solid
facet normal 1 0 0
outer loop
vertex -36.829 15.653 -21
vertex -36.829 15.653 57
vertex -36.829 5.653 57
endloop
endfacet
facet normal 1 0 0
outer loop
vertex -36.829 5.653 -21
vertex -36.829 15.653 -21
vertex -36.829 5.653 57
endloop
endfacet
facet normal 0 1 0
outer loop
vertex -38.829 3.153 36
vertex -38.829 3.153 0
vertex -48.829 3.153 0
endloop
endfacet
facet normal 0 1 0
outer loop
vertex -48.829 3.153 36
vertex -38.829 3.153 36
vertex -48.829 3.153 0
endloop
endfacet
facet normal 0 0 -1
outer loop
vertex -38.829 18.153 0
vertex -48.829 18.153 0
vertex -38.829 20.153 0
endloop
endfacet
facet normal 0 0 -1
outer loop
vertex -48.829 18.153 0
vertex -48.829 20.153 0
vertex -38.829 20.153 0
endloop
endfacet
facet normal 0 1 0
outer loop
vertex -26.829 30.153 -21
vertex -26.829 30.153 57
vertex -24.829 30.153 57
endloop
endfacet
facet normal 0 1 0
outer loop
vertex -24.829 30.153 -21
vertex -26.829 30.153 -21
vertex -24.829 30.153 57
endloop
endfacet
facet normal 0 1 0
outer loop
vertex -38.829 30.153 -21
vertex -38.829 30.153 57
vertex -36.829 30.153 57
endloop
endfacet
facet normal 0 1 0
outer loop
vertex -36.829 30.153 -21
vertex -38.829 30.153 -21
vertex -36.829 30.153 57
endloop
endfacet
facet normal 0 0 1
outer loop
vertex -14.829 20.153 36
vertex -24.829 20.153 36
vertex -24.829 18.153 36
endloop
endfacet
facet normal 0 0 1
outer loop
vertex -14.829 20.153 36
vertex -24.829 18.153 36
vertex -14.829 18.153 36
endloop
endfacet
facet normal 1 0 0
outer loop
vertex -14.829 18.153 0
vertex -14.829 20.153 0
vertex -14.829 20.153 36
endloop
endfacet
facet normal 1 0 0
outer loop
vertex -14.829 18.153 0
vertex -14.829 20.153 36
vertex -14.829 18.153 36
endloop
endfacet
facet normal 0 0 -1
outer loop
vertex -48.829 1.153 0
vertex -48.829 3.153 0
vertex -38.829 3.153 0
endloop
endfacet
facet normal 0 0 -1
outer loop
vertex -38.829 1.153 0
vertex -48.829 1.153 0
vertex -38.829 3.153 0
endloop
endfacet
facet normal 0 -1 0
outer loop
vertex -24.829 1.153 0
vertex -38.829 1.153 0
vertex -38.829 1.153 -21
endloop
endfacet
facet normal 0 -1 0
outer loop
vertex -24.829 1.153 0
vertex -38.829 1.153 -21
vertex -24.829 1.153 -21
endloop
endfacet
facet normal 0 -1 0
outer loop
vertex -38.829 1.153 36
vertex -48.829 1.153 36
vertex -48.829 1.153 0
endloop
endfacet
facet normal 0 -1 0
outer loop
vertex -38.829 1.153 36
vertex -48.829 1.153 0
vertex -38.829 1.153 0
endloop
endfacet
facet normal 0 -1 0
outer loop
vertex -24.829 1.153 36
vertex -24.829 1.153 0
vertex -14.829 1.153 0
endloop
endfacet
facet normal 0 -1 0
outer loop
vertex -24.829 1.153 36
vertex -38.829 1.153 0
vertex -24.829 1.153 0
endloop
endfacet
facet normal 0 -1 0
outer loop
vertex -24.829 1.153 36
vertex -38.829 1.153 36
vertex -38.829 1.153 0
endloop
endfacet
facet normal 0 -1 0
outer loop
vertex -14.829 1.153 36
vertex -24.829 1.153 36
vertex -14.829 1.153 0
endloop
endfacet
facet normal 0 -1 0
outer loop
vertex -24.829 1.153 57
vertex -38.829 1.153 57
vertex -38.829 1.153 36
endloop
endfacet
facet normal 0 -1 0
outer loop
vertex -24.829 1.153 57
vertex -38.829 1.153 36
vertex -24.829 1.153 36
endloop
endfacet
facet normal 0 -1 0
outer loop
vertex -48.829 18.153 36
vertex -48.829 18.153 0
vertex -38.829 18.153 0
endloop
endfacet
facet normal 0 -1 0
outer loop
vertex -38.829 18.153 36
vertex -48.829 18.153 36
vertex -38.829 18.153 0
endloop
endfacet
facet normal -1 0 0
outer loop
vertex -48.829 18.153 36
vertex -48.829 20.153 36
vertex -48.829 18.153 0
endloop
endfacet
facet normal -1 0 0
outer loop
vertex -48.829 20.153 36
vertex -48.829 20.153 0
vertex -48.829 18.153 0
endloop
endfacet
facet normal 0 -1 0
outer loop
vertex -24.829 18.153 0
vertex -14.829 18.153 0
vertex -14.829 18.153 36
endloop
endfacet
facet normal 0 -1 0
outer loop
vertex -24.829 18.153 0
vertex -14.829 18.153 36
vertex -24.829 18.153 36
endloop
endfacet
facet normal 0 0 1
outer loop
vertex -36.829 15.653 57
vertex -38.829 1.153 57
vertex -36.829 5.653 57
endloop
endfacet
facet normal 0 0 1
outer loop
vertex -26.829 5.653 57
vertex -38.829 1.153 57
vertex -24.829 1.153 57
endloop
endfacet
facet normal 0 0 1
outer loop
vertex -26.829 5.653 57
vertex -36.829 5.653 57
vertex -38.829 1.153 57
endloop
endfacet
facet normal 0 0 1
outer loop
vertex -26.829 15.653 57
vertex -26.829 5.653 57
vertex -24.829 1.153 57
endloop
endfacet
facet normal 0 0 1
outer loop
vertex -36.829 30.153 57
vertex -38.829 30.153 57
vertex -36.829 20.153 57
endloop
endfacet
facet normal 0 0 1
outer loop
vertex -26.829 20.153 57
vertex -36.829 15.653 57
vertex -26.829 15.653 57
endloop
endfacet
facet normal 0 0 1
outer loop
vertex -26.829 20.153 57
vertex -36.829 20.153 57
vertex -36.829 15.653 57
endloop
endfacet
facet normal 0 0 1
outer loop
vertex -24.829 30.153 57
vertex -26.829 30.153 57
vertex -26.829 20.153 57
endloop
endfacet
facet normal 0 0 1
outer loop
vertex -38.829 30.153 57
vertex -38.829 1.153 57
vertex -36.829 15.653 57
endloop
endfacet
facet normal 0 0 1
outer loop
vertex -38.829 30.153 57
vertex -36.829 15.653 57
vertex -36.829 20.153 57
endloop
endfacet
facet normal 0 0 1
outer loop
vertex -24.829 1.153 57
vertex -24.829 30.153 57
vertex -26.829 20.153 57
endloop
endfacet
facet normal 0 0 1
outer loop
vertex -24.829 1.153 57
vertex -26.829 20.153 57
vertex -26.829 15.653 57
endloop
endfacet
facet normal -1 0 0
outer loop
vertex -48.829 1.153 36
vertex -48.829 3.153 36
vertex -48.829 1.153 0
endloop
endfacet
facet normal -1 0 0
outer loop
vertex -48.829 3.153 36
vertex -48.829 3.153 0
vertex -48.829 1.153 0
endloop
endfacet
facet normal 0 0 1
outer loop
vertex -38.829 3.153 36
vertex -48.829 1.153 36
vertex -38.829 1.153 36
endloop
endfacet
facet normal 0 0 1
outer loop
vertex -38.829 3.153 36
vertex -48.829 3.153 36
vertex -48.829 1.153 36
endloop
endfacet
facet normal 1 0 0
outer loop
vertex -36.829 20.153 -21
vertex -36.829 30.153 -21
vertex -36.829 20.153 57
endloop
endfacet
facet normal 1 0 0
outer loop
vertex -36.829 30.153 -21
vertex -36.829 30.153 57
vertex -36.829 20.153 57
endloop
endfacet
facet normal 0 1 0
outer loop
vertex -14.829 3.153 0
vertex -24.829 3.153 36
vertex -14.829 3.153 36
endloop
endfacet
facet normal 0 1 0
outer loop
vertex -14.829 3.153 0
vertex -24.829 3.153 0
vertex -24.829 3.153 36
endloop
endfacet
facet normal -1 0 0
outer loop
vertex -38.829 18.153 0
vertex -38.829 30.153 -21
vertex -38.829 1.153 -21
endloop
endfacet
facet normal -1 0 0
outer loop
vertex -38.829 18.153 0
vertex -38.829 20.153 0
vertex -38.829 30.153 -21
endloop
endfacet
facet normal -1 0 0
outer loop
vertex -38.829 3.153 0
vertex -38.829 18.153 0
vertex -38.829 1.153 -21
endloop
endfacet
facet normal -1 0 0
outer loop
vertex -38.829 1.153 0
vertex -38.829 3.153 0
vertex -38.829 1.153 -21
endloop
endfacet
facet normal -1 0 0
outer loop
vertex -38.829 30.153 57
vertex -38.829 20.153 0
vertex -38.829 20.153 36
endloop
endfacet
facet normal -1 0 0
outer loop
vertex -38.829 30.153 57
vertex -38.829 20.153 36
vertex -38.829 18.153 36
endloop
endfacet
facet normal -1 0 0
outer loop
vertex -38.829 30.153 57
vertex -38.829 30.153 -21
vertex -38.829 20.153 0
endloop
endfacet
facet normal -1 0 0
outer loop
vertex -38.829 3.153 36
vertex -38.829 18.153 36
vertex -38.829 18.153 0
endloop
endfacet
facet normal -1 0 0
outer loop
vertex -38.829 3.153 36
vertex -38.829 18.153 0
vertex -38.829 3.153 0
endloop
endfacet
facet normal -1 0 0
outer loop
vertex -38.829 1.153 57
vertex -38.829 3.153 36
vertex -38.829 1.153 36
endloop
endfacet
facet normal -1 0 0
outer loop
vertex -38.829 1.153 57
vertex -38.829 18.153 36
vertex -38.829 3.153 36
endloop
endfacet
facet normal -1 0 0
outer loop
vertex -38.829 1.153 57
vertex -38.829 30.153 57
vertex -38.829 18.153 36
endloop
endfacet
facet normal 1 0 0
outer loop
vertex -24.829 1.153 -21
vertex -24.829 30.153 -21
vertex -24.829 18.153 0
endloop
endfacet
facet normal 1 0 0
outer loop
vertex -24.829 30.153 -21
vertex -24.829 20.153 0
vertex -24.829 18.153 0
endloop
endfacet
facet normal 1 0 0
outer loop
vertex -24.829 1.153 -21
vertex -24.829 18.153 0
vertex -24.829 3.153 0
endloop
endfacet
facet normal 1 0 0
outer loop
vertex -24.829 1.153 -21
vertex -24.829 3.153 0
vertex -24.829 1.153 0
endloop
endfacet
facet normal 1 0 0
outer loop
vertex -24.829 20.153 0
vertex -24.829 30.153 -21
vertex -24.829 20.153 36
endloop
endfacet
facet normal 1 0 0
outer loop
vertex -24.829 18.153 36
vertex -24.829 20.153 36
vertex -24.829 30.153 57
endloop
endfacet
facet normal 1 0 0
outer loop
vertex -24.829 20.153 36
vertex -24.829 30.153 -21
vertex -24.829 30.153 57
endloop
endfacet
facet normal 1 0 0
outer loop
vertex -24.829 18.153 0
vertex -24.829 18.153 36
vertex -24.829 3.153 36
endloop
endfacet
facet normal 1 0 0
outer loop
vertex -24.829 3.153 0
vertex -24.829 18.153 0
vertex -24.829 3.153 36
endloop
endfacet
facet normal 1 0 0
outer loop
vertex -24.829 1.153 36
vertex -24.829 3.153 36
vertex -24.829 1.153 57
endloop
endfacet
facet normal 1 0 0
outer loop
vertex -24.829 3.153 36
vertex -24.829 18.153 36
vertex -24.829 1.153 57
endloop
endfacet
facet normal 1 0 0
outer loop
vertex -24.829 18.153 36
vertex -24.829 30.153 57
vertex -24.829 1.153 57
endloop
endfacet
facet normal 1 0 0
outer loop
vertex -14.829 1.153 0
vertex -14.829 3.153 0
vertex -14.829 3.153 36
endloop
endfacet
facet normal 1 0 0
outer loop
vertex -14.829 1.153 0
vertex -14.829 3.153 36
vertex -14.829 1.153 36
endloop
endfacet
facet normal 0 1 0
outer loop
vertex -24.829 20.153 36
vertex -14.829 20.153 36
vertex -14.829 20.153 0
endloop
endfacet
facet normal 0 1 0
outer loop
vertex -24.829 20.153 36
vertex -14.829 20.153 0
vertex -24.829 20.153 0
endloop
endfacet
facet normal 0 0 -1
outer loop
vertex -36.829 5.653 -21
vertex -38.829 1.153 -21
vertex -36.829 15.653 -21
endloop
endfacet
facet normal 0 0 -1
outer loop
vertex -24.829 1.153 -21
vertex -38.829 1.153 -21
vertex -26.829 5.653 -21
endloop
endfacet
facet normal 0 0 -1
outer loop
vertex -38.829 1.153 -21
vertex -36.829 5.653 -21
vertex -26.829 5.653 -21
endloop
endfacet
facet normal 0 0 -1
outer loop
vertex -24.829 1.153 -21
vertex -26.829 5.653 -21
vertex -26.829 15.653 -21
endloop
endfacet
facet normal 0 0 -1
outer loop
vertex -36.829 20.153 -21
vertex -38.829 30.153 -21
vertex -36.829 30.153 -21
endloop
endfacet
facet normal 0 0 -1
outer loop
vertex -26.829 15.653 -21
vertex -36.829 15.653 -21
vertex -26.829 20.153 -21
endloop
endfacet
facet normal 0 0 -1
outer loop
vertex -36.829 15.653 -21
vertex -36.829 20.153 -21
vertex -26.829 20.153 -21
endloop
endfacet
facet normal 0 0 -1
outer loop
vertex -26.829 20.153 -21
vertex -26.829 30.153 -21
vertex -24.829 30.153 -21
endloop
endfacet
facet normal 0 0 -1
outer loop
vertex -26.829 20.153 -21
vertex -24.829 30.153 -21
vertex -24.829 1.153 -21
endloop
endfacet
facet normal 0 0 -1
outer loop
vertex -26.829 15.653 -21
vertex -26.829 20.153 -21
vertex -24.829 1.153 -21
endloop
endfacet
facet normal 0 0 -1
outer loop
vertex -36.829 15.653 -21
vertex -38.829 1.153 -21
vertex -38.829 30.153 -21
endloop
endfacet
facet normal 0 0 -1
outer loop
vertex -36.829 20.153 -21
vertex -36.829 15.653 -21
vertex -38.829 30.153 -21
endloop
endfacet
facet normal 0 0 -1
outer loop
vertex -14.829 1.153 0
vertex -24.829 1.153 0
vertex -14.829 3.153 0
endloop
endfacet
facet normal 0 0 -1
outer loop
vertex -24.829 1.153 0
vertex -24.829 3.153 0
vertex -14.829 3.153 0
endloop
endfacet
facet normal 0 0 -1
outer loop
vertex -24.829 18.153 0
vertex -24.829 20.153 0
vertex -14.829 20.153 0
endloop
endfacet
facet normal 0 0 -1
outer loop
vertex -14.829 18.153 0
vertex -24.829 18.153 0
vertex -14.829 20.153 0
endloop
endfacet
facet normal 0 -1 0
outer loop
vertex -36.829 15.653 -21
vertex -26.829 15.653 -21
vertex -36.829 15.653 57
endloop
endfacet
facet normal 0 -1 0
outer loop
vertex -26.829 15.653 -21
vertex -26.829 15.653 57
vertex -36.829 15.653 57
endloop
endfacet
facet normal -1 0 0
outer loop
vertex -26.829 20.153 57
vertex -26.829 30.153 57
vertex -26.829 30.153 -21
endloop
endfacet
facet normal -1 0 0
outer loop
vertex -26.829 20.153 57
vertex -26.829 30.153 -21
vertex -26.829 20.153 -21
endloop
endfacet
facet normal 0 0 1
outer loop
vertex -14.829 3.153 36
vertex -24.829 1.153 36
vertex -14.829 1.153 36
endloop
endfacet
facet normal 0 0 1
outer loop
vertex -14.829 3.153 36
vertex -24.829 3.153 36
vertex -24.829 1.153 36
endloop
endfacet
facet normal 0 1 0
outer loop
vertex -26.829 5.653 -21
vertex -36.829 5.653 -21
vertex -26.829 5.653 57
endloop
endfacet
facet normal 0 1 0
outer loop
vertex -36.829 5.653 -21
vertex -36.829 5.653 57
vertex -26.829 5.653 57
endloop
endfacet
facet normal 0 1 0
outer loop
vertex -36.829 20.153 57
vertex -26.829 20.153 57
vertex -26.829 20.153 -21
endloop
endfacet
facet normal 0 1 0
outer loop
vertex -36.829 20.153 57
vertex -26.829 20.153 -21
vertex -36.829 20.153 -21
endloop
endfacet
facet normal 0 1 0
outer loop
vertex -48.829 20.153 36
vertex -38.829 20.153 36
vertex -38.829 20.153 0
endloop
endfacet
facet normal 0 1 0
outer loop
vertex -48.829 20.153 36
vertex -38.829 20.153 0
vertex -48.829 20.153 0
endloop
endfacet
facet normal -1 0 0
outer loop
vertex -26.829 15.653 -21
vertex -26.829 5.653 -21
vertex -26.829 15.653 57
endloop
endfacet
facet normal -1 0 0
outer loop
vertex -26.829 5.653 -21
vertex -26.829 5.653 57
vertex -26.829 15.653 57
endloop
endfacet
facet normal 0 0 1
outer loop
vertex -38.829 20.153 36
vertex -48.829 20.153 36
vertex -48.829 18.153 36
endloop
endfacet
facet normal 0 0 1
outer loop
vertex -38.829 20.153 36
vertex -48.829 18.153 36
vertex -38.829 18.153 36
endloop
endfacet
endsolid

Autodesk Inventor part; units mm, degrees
ref_plane "YZ Plane" through (0, 0, 0) normal (1, 0, 0) x (0, 1, 0)
ref_plane "XZ Plane" through (0, 0, 0) normal (0, 1, 0) x (-1, 0, 0)
ref_plane "XY Plane" through (0, 0, 0) normal (0, 0, 1) x (1, 0, 0)
sketch "Sketch1" plane through (0, 0, 0) normal (0, 0, 1) x (1, 0, 0)
  line L0 (-36.8287, 15.6534) -> (-26.8287, 15.6534)
  line L1 (-26.8287, 15.6534) -> (-26.8287, 5.6534)
  line L2 (-26.8287, 5.6534) -> (-36.8287, 5.6534)
  line L3 (-36.8287, 5.6534) -> (-36.8287, 15.6534)
  line L4 (-31.8287, 15.6534) -> (-31.8287, 5.6534) construction
  line L5 (-31.8287, 20.1534) -> (-48.8287, 20.1534)
  line L6 (-48.8287, 20.1534) -> (-48.8287, 18.1534)
  line L7 (-48.8287, 18.1534) -> (-38.8287, 18.1534)
  line L8 (-38.8287, 18.1534) -> (-38.8287, 3.1534)
  line L9 (-38.8287, 3.1534) -> (-48.8287, 3.1534)
  line L10 (-48.8287, 3.1534) -> (-48.8287, 1.1534)
  line L11 (-48.8287, 1.1534) -> (-31.8287, 1.1534)
  line L12 (-36.8287, 10.6534) -> (-26.8287, 10.6534) construction
  line L13 (-31.8287, 20.1534) -> (-14.8287, 20.1534)
  line L14 (-14.8287, 20.1534) -> (-14.8287, 18.1534)
  line L15 (-14.8287, 18.1534) -> (-24.8287, 18.1534)
  line L16 (-24.8287, 18.1534) -> (-24.8287, 3.1534)
  line L17 (-24.8287, 3.1534) -> (-14.8287, 3.1534)
  line L18 (-14.8287, 3.1534) -> (-14.8287, 1.1534)
  line L19 (-14.8287, 1.1534) -> (-31.8287, 1.1534)
  dimension "d3" = 10
  dimension "d4" = 10
  dimension "d5" = 15
  dimension "d6" = 2
  dimension "d7" = 2
  dimension "d8" = 4.5
  dimension "d9" = 4.5
  dimension "d10" = 2
  dimension "d11" = 10
  dimension "d13" = 17
  dimension "d14" = 17
extrude "Extrusion1" add sketch "Sketch1" along normal blind 36
sketch "Sketch2" plane through (0, 0, 36) normal (0, 0, 1) x (1, 0, 0)
  line L0 (-36.8287, 5.6534) -> (-36.8287, 15.6534) projected
  line L1 (-26.8287, 5.6534) -> (-36.8287, 5.6534) projected
  line L2 (-36.8287, 15.6534) -> (-26.8287, 15.6534)
  line L3 (-26.8287, 15.6534) -> (-26.8287, 5.6534)
  line L4 (-26.8287, 5.6534) -> (-36.8287, 5.6534)
  line L5 (-36.8287, 5.6534) -> (-36.8287, 15.6534)
  line L6 (-38.8287, 20.1534) -> (-24.8287, 20.1534)
  line L7 (-24.8287, 20.1534) -> (-24.8287, 1.1534)
  line L8 (-24.8287, 1.1534) -> (-38.8287, 1.1534)
  line L9 (-38.8287, 1.1534) -> (-38.8287, 20.1534)
  line L10 (-14.8287, 20.1534) -> (-48.8287, 20.1534) projected
  point P0 (0, 0)
  dimension "d17" = 14
  dimension "d19" = 4.5
  dimension "d20" = 4.5
  dimension "d21" = 2
  dimension "d22" = 2
extrude "Extrusion2" add sketch "Sketch2" along normal blind 21
sketch "Sketch3" plane through (0, 0, 0) normal (0, 0, -1) x (-1, 0, 0)
  line L0 (26.8287, 5.6534) -> (26.8287, 15.6534)
  line L1 (36.8287, 5.6534) -> (26.8287, 5.6534)
  line L2 (26.8287, 15.6534) -> (36.8287, 15.6534)
  line L3 (36.8287, 15.6534) -> (36.8287, 5.6534)
  line L4 (36.8287, 5.6534) -> (26.8287, 5.6534)
  line L5 (26.8287, 5.6534) -> (26.8287, 15.6534)
  line L6 (24.8287, 20.1534) -> (38.8287, 20.1534)
  line L7 (38.8287, 20.1534) -> (38.8287, 1.1534)
  line L8 (38.8287, 1.1534) -> (24.8287, 1.1534)
  line L9 (24.8287, 1.1534) -> (24.8287, 20.1534)
  line L10 (49.3332, 20.1534) -> (15.3332, 20.1534)
  line L11 (36.8287, 15.6534) -> (26.8287, 15.6534) projected
  line L12 (26.8287, 5.6534) -> (36.8287, 5.6534) projected
  line L13 (36.8287, 5.6534) -> (36.8287, 15.6534) projected
  line L14 (26.8287, 15.6534) -> (26.8287, 5.6534) projected
  line L15 (14.8287, 20.1534) -> (48.8287, 20.1534) projected
  point P0 (0, 0)
  dimension "d25" = 14
  dimension "d26" = 4.5
  dimension "d27" = 4.5
  dimension "d28" = 2
  dimension "d29" = 2
extrude "Extrusion3" add sketch "Sketch3" along normal blind 21
sketch "Sketch4" plane through (0, 0, 57) normal (0, 0, 1) x (1, 0, 0)
  line L0 (-38.8287, 20.1534) -> (-48.8287, 20.1534) projected
  line L1 (-38.8287, 20.1534) -> (-38.8287, 30.1534)
  line L2 (-38.8287, 30.1534) -> (-36.8287, 30.1534)
  line L3 (-36.8287, 30.1534) -> (-36.8287, 20.1534)
  line L4 (-36.8287, 20.1534) -> (-26.8287, 20.1534)
  line L5 (-24.8287, 20.1534) -> (-38.8287, 20.1534) projected
  line L6 (-26.8287, 30.1534) -> (-24.8287, 30.1534)
  line L7 (-24.8287, 30.1534) -> (-24.8287, 20.1534)
  line L8 (-26.8287, 30.1534) -> (-26.8287, 20.1534)
  line L9 (-38.8287, 20.1534) -> (-38.8287, 1.1534) projected
  line L10 (-38.8287, 20.1534) -> (-36.8287, 20.1534)
  line L11 (-14.8287, 20.1534) -> (-24.8287, 20.1534) projected
  line L12 (-24.8287, 20.1534) -> (-26.8287, 20.1534)
  point P0 (0, 0)
  dimension "d32" = 2
  dimension "d33" = 2
  dimension "d34" = 10
extrude "Extrusion4" add sketch "Sketch4" against normal up to surface (78 mm away)
equation "\"d4\" = d3"
equation "\"d7\" = d6"
equation "\"d8\" = d9"
equation "\"d14\" = d13"
equation "\"d19\" = d20"
equation "\"d21\" = d22"
equation "\"d26\" = d27"
equation "\"d28\" = d29"
properties part number "fuselage_tail_interface_v2"
